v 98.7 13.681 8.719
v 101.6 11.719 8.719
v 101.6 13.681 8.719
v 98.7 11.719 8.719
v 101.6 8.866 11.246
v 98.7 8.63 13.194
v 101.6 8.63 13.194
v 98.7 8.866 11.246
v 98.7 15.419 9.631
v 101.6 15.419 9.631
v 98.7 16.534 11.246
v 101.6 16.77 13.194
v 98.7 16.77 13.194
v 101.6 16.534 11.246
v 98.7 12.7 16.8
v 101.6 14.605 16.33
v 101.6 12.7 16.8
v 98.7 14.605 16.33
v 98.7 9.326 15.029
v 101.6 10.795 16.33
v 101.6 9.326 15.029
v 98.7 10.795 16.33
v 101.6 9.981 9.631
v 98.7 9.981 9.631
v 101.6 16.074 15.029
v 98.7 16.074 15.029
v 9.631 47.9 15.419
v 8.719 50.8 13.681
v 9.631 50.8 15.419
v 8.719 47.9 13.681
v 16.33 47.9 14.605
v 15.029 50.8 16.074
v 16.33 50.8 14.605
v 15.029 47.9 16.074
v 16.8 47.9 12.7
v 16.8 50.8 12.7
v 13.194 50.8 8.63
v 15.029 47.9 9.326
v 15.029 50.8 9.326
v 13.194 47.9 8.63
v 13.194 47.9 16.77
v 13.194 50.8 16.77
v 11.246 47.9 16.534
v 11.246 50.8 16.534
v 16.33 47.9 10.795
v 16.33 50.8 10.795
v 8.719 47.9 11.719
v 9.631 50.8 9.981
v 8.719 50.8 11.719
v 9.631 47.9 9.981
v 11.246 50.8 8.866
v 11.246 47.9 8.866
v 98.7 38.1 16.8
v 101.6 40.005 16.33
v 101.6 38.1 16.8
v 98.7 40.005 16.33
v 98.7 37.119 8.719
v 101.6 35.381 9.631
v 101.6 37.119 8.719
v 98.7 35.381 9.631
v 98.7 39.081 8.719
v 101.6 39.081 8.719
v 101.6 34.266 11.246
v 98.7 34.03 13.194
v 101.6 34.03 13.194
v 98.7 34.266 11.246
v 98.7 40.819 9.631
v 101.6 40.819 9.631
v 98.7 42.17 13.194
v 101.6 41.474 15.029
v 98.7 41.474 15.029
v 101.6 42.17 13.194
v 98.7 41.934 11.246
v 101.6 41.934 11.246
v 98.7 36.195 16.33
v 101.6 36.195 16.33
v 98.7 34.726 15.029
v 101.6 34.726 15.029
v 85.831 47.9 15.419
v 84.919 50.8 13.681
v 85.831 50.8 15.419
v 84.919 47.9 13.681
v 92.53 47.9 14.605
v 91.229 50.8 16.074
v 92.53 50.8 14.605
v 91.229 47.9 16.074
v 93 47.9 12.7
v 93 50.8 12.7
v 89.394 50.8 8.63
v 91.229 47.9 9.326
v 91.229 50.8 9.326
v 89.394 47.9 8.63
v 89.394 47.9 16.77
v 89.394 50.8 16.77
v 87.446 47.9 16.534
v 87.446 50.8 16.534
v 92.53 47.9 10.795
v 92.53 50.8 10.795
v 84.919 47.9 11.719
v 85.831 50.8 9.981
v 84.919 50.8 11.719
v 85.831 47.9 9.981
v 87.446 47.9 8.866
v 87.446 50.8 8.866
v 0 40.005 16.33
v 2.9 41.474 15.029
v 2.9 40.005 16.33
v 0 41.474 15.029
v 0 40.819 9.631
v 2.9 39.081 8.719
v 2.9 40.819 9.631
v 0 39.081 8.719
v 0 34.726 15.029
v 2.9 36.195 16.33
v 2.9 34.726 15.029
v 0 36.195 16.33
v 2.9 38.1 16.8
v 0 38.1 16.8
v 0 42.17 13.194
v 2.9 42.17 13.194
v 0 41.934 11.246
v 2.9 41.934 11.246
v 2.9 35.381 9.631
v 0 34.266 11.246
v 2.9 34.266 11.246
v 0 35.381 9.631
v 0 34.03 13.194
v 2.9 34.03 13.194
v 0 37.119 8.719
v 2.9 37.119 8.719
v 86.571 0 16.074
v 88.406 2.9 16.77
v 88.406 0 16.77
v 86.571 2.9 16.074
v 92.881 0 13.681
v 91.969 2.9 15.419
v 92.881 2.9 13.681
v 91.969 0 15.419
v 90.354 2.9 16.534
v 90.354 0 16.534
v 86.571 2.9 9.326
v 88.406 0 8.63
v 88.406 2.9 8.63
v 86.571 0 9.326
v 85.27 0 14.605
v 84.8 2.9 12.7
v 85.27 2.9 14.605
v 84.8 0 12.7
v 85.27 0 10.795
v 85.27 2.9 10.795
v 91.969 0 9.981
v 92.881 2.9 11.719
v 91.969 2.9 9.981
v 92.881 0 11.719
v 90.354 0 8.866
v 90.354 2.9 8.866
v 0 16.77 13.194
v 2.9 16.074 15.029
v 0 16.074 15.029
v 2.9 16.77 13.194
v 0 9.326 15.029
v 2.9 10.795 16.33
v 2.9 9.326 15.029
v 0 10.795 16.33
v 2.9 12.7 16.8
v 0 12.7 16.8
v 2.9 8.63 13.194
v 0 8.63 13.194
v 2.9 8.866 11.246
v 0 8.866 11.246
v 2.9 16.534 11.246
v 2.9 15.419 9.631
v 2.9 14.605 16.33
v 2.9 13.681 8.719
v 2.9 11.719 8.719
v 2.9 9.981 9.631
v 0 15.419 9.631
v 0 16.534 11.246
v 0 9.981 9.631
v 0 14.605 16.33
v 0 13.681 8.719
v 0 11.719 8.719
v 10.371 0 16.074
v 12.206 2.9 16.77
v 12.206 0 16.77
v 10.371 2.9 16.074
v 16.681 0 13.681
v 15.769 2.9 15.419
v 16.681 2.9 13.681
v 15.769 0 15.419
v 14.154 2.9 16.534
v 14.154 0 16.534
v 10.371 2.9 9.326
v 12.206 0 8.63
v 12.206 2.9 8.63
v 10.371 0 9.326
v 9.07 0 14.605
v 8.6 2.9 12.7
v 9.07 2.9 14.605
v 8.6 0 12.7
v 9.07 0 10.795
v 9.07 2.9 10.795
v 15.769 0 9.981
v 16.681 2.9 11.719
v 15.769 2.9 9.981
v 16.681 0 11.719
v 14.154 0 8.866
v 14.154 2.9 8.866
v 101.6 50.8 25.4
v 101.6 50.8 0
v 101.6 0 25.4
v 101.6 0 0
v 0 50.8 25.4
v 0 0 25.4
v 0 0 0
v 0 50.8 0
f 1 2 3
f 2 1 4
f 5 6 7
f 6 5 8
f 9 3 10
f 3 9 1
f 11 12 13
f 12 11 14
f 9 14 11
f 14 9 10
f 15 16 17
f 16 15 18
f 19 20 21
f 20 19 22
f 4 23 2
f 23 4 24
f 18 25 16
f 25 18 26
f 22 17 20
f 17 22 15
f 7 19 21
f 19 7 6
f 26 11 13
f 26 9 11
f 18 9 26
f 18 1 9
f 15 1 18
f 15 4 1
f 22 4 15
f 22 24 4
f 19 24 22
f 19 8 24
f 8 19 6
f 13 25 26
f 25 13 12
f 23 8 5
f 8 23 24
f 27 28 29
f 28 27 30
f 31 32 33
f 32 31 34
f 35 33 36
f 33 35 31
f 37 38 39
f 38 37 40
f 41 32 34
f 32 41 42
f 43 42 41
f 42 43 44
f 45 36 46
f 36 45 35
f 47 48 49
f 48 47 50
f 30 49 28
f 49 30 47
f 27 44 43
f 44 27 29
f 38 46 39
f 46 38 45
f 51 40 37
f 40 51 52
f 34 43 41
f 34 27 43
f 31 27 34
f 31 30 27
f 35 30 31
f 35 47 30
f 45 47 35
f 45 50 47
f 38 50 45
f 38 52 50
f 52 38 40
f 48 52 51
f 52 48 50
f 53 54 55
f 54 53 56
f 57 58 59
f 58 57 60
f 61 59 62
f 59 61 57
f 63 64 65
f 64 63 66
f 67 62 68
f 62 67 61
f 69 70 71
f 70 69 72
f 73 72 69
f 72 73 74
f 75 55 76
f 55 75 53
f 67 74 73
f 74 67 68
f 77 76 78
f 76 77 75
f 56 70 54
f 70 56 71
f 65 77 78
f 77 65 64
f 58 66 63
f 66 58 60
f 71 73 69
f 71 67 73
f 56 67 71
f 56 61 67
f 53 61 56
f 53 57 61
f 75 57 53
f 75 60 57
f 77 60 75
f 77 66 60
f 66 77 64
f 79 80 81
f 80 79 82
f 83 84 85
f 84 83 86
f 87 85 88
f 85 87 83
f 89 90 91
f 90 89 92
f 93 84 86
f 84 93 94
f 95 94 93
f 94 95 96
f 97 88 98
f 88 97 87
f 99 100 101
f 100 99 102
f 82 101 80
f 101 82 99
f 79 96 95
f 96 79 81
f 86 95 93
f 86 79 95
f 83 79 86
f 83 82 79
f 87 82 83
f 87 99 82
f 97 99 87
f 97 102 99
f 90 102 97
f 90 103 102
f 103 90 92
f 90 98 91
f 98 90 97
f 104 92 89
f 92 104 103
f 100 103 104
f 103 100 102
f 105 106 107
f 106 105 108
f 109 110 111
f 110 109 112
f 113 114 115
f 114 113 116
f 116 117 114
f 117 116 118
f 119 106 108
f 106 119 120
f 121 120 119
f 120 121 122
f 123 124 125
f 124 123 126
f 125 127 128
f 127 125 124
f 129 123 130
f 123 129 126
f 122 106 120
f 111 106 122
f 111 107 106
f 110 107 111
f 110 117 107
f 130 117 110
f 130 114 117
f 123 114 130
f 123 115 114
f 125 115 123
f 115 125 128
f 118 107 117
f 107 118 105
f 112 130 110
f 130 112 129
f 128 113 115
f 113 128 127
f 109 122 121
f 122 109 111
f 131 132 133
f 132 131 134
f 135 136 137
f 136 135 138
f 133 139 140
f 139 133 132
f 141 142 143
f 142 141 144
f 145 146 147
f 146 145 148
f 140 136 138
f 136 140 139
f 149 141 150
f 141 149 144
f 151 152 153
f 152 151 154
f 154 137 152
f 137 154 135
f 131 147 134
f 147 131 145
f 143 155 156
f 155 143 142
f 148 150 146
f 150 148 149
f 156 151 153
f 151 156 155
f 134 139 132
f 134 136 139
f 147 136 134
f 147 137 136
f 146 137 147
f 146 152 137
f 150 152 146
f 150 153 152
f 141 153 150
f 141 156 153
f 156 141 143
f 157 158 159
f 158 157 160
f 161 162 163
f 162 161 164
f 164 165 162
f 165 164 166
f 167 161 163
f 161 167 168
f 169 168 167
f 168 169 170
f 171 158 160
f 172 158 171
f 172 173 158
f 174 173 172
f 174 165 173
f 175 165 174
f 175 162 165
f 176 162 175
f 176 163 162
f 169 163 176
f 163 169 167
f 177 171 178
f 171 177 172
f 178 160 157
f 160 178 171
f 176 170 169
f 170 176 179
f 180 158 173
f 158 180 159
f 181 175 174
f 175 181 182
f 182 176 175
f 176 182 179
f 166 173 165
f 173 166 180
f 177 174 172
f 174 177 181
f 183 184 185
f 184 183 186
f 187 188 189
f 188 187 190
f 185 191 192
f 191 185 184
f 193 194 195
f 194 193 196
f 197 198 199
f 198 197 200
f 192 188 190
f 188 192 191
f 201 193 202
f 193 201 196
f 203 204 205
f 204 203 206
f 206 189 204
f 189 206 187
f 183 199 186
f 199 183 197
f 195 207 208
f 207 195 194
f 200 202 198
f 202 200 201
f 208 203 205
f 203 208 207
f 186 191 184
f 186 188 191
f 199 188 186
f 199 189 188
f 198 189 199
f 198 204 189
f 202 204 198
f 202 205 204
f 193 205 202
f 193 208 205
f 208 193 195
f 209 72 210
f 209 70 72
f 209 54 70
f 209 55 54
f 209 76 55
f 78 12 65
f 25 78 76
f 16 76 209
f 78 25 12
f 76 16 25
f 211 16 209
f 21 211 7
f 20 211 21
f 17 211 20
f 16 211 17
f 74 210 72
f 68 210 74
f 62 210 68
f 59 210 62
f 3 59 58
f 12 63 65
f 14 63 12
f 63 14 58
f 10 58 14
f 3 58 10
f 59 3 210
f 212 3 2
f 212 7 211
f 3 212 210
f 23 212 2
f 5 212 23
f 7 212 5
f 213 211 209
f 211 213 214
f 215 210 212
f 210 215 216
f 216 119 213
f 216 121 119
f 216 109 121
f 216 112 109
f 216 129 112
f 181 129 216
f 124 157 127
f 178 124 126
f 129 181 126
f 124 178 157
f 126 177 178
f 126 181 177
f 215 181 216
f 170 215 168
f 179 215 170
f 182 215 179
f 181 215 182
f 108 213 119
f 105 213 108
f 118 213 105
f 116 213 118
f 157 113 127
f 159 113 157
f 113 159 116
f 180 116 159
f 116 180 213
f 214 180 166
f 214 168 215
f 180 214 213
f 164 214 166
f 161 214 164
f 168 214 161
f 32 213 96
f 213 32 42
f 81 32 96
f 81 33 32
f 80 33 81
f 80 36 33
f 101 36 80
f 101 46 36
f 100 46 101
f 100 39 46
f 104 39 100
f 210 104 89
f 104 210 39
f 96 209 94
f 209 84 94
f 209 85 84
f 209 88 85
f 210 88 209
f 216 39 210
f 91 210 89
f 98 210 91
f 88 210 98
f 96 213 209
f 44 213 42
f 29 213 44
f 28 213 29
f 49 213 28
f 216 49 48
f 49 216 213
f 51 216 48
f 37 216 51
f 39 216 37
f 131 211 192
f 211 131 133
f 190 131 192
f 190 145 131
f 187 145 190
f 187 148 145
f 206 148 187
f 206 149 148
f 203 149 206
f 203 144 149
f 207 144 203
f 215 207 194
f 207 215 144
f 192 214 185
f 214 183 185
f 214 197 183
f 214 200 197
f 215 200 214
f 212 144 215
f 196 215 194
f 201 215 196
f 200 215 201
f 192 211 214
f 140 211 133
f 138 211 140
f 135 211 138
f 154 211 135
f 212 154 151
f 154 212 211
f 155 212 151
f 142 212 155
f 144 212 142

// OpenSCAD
module base(x_count = 1, y_count = 1,unit = 25.4*2, h=25.4,  d_magnet = 8+.2, h_magnet=2.8+.1, center = false) {
    d_xyz= center ?  [0,0,0] : [unit*x_count, unit*y_count, h]/2;
    translate(d_xyz)
    difference(){
        cube([unit*x_count, unit*y_count, h], center=true);
        for(i=[0:1],j=[-1,1]){
            rotate([0,0,180*i])
                translate([unit*x_count/2+.1, j*(unit*y_count/2-h/2),0])
                rotate([0,-90,0])
                cylinder(d=d_magnet,h=h_magnet+.1);
            rotate([0,0,180*i])
                translate([j*(unit*x_count/2-h/2), unit*y_count/2+.1,0])
                rotate([90,0,0])
                cylinder(d=d_magnet,h=h_magnet+.1);

        }
    }
}

base(2,1, center=false);
